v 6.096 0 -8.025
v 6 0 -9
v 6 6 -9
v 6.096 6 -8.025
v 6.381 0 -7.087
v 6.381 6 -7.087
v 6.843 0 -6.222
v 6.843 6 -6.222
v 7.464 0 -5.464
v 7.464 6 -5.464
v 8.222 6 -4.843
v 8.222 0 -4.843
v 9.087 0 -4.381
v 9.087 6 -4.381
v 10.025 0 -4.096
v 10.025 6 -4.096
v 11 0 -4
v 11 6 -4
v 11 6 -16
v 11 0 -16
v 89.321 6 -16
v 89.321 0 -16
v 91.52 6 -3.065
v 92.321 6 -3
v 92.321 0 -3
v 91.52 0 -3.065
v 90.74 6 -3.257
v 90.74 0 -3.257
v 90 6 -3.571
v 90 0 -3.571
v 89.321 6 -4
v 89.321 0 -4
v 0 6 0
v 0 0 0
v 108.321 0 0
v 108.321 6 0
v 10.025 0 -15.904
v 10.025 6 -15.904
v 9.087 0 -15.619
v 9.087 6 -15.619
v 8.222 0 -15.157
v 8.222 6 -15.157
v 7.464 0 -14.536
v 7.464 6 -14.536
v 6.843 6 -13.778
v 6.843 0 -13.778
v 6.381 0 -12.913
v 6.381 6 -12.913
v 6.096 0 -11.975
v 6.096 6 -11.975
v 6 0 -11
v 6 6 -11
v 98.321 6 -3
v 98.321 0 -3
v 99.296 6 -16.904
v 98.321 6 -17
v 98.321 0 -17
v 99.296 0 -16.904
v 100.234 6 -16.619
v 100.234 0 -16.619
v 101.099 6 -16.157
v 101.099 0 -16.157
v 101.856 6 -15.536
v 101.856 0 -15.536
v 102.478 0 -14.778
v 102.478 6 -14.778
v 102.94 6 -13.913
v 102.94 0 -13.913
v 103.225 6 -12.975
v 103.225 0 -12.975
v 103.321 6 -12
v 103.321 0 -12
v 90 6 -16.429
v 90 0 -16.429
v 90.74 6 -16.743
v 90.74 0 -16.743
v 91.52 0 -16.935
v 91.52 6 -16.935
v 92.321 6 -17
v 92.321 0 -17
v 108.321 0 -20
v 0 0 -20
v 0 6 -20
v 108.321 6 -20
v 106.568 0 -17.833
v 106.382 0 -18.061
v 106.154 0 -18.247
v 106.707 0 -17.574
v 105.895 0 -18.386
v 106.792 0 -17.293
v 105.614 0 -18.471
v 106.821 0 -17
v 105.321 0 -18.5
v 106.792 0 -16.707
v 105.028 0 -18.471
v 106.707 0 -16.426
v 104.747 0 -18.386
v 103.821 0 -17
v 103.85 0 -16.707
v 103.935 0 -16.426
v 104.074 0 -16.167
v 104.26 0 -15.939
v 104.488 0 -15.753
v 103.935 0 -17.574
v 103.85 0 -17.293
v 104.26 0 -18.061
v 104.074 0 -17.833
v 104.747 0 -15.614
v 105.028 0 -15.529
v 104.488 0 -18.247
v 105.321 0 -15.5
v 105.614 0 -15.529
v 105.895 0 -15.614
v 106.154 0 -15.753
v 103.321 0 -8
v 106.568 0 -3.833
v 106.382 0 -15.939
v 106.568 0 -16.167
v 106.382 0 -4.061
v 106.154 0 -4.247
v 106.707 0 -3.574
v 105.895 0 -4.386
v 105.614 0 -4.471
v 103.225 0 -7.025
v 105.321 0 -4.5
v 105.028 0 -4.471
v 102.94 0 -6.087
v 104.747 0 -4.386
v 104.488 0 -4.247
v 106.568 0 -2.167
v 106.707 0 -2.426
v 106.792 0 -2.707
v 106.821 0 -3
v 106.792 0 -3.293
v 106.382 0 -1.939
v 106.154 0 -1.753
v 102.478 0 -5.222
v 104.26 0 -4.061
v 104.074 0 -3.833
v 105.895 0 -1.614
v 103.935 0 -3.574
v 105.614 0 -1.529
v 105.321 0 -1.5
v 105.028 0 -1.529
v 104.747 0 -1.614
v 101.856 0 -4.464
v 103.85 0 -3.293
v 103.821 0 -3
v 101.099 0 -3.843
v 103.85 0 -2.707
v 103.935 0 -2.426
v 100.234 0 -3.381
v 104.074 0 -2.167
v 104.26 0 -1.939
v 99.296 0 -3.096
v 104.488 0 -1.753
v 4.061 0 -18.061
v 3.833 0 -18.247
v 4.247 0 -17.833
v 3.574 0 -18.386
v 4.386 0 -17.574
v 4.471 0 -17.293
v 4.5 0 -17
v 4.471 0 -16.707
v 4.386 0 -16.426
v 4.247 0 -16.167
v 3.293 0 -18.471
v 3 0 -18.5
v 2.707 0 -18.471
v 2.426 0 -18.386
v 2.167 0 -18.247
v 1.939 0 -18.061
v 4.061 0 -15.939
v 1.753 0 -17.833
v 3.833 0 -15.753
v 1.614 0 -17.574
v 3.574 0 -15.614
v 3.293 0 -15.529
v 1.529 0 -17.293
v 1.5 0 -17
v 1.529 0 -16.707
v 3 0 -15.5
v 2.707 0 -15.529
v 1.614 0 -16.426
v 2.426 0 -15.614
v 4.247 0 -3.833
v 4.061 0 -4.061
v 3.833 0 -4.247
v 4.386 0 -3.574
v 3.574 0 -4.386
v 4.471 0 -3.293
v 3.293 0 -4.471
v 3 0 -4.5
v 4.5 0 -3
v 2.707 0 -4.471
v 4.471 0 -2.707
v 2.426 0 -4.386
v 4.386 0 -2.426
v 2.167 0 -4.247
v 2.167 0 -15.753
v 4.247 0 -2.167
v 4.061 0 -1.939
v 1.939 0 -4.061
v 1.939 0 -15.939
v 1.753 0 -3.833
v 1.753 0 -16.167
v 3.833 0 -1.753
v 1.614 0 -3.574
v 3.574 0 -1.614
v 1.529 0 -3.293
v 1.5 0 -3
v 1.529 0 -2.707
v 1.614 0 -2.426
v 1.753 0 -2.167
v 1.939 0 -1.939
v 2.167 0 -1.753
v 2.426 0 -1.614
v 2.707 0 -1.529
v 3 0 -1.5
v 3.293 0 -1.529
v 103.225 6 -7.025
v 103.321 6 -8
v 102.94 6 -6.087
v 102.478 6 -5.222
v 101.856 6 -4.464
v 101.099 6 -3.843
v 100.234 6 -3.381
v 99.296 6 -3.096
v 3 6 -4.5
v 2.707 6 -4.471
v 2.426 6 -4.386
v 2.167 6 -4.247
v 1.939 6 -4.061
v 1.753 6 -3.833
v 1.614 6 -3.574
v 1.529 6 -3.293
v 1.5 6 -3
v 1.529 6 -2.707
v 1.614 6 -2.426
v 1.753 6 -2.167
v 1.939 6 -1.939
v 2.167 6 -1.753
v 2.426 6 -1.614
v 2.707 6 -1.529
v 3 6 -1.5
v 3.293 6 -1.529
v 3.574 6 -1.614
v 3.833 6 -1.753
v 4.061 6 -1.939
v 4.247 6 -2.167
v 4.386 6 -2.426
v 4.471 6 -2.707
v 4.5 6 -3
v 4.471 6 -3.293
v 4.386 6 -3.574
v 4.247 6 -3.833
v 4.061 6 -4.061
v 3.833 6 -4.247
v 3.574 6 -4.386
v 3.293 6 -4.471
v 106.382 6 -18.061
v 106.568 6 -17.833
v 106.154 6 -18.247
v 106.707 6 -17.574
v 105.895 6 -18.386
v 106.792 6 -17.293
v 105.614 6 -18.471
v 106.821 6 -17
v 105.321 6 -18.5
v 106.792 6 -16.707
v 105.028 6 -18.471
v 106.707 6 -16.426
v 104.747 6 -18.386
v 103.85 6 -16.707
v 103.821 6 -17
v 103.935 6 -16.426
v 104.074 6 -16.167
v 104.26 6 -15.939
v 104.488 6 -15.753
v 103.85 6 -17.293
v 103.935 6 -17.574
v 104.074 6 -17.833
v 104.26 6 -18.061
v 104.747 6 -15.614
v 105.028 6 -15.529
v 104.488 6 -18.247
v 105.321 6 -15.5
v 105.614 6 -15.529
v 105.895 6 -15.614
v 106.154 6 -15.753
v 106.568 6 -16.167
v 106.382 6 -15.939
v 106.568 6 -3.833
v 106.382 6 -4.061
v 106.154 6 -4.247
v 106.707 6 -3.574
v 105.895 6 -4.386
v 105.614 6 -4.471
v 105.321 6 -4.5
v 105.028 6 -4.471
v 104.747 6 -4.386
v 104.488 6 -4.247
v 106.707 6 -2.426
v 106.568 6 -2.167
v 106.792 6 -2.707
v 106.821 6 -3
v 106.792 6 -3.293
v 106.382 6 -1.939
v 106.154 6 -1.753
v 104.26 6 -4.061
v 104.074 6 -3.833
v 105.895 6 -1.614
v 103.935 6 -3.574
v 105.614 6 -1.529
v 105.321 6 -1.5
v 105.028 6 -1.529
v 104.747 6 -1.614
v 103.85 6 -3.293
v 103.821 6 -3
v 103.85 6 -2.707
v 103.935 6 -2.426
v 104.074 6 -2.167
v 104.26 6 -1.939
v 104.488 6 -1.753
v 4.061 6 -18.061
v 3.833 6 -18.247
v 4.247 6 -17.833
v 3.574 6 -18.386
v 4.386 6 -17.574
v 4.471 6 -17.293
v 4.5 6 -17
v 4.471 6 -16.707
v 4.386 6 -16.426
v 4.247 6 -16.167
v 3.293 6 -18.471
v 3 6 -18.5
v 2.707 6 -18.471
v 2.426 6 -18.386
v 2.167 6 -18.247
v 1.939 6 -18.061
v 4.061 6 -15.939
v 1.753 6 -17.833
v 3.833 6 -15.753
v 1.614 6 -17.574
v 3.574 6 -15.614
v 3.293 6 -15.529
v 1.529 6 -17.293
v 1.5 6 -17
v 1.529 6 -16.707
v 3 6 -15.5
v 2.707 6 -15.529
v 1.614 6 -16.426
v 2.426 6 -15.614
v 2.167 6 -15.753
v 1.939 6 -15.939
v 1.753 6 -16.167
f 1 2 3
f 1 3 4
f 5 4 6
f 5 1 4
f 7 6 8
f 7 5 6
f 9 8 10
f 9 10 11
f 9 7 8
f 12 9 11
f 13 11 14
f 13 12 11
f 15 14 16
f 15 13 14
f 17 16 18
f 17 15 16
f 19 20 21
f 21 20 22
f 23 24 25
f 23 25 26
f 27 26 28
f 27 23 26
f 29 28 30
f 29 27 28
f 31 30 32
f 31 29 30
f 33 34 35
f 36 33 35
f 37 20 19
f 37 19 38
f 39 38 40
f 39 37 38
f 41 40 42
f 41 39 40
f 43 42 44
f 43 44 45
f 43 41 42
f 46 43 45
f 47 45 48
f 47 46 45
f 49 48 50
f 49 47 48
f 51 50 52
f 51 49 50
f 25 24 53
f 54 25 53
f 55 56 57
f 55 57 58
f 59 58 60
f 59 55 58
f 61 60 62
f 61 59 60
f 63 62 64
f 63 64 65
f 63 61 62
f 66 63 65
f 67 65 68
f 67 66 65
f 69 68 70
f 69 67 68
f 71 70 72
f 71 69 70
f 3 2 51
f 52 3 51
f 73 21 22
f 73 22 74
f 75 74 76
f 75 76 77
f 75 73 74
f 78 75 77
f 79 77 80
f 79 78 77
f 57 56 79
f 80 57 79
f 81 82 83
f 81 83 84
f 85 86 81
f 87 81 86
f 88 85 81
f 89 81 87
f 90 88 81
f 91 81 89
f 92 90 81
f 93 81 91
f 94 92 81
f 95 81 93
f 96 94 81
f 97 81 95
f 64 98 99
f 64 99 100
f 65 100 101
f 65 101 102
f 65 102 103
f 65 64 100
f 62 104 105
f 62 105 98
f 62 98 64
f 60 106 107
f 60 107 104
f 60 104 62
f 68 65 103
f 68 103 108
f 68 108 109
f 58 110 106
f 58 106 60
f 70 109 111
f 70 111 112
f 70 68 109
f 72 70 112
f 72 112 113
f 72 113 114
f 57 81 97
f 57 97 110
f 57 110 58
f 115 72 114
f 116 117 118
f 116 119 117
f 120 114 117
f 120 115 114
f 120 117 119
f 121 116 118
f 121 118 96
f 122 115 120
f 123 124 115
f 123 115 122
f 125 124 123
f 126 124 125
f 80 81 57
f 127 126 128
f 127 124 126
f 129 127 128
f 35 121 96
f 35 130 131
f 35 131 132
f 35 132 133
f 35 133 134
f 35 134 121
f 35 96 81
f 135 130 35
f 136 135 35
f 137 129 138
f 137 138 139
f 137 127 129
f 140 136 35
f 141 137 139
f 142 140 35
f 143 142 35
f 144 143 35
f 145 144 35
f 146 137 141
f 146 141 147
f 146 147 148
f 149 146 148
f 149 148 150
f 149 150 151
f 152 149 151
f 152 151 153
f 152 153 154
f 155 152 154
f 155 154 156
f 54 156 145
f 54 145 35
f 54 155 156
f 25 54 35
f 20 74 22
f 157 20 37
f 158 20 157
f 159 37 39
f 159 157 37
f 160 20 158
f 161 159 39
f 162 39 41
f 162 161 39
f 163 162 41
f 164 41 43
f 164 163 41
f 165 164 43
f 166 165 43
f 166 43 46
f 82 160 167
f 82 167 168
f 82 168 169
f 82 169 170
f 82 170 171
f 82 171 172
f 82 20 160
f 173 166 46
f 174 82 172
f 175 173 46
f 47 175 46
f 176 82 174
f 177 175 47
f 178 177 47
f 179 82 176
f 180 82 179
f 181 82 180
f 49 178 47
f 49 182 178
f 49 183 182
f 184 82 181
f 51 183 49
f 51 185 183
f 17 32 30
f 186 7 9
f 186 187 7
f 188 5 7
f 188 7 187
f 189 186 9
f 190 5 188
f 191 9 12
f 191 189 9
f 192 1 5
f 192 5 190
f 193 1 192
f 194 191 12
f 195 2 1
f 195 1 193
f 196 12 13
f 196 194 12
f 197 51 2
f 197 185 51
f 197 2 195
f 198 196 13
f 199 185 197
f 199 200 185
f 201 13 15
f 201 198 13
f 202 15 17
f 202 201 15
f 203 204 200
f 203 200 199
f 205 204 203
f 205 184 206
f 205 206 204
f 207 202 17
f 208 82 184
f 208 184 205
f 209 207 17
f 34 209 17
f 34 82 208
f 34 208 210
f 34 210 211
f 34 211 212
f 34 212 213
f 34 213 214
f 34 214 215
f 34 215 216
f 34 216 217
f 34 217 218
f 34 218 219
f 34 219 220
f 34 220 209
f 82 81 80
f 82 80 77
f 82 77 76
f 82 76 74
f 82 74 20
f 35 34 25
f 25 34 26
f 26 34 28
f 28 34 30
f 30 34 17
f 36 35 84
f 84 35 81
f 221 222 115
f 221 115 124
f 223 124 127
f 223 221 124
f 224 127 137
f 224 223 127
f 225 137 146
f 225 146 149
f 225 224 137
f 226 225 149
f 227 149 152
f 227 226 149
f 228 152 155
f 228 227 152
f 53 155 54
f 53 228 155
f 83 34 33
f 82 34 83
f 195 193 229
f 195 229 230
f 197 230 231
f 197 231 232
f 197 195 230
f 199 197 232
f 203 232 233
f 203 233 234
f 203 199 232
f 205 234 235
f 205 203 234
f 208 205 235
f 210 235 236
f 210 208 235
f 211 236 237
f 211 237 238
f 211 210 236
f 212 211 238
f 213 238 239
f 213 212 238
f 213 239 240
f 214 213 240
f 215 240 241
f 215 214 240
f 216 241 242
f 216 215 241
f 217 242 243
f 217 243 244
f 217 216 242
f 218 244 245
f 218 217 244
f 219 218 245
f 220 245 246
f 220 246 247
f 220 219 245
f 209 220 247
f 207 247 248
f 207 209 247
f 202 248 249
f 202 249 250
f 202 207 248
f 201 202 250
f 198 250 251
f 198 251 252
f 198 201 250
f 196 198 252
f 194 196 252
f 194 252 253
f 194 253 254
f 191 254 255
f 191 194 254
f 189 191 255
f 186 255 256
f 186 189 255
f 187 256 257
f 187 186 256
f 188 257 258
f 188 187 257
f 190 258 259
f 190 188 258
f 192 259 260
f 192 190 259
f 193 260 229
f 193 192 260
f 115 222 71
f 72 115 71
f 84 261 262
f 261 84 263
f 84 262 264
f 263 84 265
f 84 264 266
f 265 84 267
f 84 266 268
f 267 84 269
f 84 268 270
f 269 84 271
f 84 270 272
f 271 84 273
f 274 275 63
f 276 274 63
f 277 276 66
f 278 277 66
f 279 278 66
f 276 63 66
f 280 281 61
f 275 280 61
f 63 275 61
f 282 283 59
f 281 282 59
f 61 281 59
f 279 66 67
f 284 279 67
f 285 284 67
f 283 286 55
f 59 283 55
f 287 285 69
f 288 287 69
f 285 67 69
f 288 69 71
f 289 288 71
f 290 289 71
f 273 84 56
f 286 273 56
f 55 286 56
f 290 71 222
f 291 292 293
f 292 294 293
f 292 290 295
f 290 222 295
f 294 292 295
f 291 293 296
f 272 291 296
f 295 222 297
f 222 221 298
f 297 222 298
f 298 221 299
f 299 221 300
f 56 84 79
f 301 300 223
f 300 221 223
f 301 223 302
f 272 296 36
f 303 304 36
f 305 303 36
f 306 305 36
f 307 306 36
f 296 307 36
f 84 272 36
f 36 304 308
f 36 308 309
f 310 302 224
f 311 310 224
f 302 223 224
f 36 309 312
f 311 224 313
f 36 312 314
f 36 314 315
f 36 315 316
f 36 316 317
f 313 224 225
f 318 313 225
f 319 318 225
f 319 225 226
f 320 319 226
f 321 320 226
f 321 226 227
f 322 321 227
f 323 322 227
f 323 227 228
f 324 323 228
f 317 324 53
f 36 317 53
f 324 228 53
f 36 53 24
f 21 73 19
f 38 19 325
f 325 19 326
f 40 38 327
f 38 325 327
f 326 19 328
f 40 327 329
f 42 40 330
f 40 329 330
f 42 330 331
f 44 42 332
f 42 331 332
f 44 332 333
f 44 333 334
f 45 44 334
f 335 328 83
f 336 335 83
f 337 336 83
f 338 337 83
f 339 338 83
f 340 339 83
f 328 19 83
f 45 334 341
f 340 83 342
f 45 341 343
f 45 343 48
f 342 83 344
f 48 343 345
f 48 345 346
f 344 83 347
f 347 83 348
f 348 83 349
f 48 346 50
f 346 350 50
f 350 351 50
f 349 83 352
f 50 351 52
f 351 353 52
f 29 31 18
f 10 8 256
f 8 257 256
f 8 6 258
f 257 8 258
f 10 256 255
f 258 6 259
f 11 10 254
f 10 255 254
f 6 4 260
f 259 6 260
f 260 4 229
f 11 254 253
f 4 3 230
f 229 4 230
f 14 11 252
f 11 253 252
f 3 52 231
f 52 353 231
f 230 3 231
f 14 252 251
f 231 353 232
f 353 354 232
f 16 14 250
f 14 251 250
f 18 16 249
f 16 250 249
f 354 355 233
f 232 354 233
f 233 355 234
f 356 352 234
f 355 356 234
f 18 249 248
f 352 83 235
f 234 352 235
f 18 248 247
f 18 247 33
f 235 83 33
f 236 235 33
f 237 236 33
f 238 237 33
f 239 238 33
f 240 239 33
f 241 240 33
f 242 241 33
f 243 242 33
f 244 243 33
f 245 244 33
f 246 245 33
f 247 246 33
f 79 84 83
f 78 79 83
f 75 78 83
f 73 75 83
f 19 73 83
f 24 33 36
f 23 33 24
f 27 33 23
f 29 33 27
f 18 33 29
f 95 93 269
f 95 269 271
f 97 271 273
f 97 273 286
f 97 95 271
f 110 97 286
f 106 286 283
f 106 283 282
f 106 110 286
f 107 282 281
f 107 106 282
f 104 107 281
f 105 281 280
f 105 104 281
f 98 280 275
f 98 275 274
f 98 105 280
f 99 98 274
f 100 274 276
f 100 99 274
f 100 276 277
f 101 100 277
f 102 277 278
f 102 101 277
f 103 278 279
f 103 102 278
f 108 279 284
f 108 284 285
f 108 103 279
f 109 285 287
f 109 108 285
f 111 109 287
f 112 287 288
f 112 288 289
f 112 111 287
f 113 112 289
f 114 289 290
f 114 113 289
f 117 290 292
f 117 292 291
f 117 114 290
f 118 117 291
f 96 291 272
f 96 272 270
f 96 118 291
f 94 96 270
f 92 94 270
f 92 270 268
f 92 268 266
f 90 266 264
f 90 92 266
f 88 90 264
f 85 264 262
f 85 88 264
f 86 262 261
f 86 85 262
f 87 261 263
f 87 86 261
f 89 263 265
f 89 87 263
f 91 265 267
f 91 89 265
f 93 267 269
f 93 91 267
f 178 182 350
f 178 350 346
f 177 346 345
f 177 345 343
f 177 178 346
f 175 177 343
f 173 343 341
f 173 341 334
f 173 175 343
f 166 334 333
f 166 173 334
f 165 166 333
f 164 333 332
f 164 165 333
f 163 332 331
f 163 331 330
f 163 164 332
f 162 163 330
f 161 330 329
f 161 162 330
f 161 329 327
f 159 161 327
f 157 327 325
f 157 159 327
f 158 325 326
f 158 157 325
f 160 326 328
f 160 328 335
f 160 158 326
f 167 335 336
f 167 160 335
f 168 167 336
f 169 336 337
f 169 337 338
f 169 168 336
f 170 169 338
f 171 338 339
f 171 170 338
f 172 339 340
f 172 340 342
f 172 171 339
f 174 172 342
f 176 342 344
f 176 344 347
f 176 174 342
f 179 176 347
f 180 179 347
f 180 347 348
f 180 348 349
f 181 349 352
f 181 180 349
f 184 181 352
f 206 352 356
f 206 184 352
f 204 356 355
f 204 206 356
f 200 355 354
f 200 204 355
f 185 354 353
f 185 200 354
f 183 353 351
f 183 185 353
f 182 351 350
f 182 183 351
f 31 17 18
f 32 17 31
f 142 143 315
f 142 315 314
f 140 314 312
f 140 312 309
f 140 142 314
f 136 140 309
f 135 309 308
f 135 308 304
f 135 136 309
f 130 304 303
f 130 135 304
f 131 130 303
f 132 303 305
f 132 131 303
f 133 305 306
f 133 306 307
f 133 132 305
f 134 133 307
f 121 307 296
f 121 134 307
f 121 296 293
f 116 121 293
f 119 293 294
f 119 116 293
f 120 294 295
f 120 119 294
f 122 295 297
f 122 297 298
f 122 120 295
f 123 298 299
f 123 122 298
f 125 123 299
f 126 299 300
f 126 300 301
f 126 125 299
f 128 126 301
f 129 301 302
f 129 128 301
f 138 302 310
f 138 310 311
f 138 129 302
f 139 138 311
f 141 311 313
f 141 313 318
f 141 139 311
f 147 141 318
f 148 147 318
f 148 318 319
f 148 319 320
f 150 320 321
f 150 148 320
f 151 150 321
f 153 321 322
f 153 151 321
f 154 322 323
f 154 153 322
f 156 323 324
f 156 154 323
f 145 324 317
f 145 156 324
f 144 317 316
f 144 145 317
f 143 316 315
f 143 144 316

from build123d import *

# Parameters (mm, degrees)
SKETCH1_W           = 108.320866354
SKETCH1_H           = 20
SKETCH1_R           = 1.5
SKETCH1_W_2         = 96.320866354
SKETCH1_H_2         = 12
BOSS_EXTRUDE1_DEPTH = 6
CUT_EXTRUDE1_DEPTH  = 111.315049234
FILLET1_R           = 5


with BuildPart() as part:
    # Sketch1 → Boss-Extrude1 (new body)
    with BuildSketch(Plane(origin=(0, 0, 0), x_dir=(1, 0, 0), z_dir=(0, 1, 0))):
        with Locations((54.160433177, 10)):
            Rectangle(SKETCH1_W, SKETCH1_H)
        with Locations(Location((3, 17, 0), (0, 0, 270))):
            Circle(SKETCH1_R, mode=Mode.SUBTRACT)
        with Locations(Location((3, 3, 0), (0, 0, 90))):
            Circle(SKETCH1_R, mode=Mode.SUBTRACT)
        with Locations(Location((105.320866354, 3, 0), (0, 0, 270))):
            Circle(SKETCH1_R, mode=Mode.SUBTRACT)
        with Locations(Location((105.320866354, 17, 0), (0, 0, 90))):
            Circle(SKETCH1_R, mode=Mode.SUBTRACT)
        with Locations((54.160433177, 10)):
            Rectangle(SKETCH1_W_2, SKETCH1_H_2, mode=Mode.SUBTRACT)
    extrude(amount=BOSS_EXTRUDE1_DEPTH)

    # Sketch2 → Cut-Extrude1 (cut, through all)
    with BuildSketch(Plane(origin=(0, 6, 0), x_dir=(1, 0, 0), z_dir=(0, 1, 0))):
        Polygon((89.320866354, 17), (89.320866354, 16), (102.320866354, 16), (102.320866354, 4), (89.320866354, 4), (89.320866354, 3), (103.320866354, 3), (103.320866354, 17), align=None)
    extrude(amount=-CUT_EXTRUDE1_DEPTH, mode=Mode.SUBTRACT)

    # Fillet1
    # the kernel refuses this fillet: 5 mm, written as the material it adds along each edge
    with BuildSketch(Plane(origin=(103.320866354, 6, -17), x_dir=(0, 0, 1), z_dir=(0, -1, 0)), Plane(origin=(103.320866354, 6, -3), x_dir=(-1, 0, 0), z_dir=(0, -1, 0)), Plane(origin=(6, 0, -16), x_dir=(0, 0, 1), z_dir=(0, 1, 0))) as fillet1_piece_1:
        with BuildLine():
            CenterArc((FILLET1_R, FILLET1_R), FILLET1_R, 180, 90)
            Line((0, FILLET1_R), (-FILLET1_R * 0.02, FILLET1_R))
            Line((-FILLET1_R * 0.02, FILLET1_R), (-FILLET1_R * 0.02, -FILLET1_R * 0.02))
            Line((-FILLET1_R * 0.02, -FILLET1_R * 0.02), (FILLET1_R, -FILLET1_R * 0.02))
            Line((FILLET1_R, -FILLET1_R * 0.02), (FILLET1_R, 0))
        make_face()
    extrude(amount=6)
    with BuildSketch(Plane(origin=(89.320866354, 6, -17), x_dir=(1, 0, 0), z_dir=(0, -1, 0))) as fillet1_piece_2:
        with BuildLine():
            CenterArc((3, 5), FILLET1_R, 233.130102354, 36.869897646)
            Line((0, 1), (-0.06, 0.92))
            ThreePointArc((-0.06, 0.92), (-0.1, 0.5), (-0.1, 0))
            Line((-0.1, 0), (0, -0.1))
            Line((0, -0.1), (3, -0.1))
            Line((3, -0.1), (3, 0))
        make_face()
    extrude(amount=6)
    with BuildSketch(Plane(origin=(89.320866354, 6, -3), x_dir=(0, 0, -1), z_dir=(0, -1, 0))) as fillet1_piece_3:
        with BuildLine():
            CenterArc((5, 3), FILLET1_R, 180, 36.869897646)
            Line((0, 3), (-0.1, 3))
            Line((-0.1, 3), (-0.1, 0))
            Line((-0.1, 0), (0, -0.1))
            ThreePointArc((0, -0.1), (0.5, -0.1), (0.92, -0.06))
            Line((0.92, -0.06), (1, 0))
        make_face()
    extrude(amount=6)
    with BuildSketch(Plane(origin=(6, 0, -4), x_dir=(0, 0, -1), z_dir=(0, 1, 0))) as fillet1_piece_4:
        with BuildLine():
            CenterArc((FILLET1_R, -FILLET1_R), FILLET1_R, 90, 90)
            Line((0, -FILLET1_R), (-FILLET1_R * 0.02, -FILLET1_R))
            Line((-FILLET1_R * 0.02, -FILLET1_R), (-FILLET1_R * 0.02, FILLET1_R * 0.02))
            Line((-FILLET1_R * 0.02, FILLET1_R * 0.02), (FILLET1_R, FILLET1_R * 0.02))
            Line((FILLET1_R, FILLET1_R * 0.02), (FILLET1_R, 0))
        make_face()
    extrude(amount=6)


solid = part.part
